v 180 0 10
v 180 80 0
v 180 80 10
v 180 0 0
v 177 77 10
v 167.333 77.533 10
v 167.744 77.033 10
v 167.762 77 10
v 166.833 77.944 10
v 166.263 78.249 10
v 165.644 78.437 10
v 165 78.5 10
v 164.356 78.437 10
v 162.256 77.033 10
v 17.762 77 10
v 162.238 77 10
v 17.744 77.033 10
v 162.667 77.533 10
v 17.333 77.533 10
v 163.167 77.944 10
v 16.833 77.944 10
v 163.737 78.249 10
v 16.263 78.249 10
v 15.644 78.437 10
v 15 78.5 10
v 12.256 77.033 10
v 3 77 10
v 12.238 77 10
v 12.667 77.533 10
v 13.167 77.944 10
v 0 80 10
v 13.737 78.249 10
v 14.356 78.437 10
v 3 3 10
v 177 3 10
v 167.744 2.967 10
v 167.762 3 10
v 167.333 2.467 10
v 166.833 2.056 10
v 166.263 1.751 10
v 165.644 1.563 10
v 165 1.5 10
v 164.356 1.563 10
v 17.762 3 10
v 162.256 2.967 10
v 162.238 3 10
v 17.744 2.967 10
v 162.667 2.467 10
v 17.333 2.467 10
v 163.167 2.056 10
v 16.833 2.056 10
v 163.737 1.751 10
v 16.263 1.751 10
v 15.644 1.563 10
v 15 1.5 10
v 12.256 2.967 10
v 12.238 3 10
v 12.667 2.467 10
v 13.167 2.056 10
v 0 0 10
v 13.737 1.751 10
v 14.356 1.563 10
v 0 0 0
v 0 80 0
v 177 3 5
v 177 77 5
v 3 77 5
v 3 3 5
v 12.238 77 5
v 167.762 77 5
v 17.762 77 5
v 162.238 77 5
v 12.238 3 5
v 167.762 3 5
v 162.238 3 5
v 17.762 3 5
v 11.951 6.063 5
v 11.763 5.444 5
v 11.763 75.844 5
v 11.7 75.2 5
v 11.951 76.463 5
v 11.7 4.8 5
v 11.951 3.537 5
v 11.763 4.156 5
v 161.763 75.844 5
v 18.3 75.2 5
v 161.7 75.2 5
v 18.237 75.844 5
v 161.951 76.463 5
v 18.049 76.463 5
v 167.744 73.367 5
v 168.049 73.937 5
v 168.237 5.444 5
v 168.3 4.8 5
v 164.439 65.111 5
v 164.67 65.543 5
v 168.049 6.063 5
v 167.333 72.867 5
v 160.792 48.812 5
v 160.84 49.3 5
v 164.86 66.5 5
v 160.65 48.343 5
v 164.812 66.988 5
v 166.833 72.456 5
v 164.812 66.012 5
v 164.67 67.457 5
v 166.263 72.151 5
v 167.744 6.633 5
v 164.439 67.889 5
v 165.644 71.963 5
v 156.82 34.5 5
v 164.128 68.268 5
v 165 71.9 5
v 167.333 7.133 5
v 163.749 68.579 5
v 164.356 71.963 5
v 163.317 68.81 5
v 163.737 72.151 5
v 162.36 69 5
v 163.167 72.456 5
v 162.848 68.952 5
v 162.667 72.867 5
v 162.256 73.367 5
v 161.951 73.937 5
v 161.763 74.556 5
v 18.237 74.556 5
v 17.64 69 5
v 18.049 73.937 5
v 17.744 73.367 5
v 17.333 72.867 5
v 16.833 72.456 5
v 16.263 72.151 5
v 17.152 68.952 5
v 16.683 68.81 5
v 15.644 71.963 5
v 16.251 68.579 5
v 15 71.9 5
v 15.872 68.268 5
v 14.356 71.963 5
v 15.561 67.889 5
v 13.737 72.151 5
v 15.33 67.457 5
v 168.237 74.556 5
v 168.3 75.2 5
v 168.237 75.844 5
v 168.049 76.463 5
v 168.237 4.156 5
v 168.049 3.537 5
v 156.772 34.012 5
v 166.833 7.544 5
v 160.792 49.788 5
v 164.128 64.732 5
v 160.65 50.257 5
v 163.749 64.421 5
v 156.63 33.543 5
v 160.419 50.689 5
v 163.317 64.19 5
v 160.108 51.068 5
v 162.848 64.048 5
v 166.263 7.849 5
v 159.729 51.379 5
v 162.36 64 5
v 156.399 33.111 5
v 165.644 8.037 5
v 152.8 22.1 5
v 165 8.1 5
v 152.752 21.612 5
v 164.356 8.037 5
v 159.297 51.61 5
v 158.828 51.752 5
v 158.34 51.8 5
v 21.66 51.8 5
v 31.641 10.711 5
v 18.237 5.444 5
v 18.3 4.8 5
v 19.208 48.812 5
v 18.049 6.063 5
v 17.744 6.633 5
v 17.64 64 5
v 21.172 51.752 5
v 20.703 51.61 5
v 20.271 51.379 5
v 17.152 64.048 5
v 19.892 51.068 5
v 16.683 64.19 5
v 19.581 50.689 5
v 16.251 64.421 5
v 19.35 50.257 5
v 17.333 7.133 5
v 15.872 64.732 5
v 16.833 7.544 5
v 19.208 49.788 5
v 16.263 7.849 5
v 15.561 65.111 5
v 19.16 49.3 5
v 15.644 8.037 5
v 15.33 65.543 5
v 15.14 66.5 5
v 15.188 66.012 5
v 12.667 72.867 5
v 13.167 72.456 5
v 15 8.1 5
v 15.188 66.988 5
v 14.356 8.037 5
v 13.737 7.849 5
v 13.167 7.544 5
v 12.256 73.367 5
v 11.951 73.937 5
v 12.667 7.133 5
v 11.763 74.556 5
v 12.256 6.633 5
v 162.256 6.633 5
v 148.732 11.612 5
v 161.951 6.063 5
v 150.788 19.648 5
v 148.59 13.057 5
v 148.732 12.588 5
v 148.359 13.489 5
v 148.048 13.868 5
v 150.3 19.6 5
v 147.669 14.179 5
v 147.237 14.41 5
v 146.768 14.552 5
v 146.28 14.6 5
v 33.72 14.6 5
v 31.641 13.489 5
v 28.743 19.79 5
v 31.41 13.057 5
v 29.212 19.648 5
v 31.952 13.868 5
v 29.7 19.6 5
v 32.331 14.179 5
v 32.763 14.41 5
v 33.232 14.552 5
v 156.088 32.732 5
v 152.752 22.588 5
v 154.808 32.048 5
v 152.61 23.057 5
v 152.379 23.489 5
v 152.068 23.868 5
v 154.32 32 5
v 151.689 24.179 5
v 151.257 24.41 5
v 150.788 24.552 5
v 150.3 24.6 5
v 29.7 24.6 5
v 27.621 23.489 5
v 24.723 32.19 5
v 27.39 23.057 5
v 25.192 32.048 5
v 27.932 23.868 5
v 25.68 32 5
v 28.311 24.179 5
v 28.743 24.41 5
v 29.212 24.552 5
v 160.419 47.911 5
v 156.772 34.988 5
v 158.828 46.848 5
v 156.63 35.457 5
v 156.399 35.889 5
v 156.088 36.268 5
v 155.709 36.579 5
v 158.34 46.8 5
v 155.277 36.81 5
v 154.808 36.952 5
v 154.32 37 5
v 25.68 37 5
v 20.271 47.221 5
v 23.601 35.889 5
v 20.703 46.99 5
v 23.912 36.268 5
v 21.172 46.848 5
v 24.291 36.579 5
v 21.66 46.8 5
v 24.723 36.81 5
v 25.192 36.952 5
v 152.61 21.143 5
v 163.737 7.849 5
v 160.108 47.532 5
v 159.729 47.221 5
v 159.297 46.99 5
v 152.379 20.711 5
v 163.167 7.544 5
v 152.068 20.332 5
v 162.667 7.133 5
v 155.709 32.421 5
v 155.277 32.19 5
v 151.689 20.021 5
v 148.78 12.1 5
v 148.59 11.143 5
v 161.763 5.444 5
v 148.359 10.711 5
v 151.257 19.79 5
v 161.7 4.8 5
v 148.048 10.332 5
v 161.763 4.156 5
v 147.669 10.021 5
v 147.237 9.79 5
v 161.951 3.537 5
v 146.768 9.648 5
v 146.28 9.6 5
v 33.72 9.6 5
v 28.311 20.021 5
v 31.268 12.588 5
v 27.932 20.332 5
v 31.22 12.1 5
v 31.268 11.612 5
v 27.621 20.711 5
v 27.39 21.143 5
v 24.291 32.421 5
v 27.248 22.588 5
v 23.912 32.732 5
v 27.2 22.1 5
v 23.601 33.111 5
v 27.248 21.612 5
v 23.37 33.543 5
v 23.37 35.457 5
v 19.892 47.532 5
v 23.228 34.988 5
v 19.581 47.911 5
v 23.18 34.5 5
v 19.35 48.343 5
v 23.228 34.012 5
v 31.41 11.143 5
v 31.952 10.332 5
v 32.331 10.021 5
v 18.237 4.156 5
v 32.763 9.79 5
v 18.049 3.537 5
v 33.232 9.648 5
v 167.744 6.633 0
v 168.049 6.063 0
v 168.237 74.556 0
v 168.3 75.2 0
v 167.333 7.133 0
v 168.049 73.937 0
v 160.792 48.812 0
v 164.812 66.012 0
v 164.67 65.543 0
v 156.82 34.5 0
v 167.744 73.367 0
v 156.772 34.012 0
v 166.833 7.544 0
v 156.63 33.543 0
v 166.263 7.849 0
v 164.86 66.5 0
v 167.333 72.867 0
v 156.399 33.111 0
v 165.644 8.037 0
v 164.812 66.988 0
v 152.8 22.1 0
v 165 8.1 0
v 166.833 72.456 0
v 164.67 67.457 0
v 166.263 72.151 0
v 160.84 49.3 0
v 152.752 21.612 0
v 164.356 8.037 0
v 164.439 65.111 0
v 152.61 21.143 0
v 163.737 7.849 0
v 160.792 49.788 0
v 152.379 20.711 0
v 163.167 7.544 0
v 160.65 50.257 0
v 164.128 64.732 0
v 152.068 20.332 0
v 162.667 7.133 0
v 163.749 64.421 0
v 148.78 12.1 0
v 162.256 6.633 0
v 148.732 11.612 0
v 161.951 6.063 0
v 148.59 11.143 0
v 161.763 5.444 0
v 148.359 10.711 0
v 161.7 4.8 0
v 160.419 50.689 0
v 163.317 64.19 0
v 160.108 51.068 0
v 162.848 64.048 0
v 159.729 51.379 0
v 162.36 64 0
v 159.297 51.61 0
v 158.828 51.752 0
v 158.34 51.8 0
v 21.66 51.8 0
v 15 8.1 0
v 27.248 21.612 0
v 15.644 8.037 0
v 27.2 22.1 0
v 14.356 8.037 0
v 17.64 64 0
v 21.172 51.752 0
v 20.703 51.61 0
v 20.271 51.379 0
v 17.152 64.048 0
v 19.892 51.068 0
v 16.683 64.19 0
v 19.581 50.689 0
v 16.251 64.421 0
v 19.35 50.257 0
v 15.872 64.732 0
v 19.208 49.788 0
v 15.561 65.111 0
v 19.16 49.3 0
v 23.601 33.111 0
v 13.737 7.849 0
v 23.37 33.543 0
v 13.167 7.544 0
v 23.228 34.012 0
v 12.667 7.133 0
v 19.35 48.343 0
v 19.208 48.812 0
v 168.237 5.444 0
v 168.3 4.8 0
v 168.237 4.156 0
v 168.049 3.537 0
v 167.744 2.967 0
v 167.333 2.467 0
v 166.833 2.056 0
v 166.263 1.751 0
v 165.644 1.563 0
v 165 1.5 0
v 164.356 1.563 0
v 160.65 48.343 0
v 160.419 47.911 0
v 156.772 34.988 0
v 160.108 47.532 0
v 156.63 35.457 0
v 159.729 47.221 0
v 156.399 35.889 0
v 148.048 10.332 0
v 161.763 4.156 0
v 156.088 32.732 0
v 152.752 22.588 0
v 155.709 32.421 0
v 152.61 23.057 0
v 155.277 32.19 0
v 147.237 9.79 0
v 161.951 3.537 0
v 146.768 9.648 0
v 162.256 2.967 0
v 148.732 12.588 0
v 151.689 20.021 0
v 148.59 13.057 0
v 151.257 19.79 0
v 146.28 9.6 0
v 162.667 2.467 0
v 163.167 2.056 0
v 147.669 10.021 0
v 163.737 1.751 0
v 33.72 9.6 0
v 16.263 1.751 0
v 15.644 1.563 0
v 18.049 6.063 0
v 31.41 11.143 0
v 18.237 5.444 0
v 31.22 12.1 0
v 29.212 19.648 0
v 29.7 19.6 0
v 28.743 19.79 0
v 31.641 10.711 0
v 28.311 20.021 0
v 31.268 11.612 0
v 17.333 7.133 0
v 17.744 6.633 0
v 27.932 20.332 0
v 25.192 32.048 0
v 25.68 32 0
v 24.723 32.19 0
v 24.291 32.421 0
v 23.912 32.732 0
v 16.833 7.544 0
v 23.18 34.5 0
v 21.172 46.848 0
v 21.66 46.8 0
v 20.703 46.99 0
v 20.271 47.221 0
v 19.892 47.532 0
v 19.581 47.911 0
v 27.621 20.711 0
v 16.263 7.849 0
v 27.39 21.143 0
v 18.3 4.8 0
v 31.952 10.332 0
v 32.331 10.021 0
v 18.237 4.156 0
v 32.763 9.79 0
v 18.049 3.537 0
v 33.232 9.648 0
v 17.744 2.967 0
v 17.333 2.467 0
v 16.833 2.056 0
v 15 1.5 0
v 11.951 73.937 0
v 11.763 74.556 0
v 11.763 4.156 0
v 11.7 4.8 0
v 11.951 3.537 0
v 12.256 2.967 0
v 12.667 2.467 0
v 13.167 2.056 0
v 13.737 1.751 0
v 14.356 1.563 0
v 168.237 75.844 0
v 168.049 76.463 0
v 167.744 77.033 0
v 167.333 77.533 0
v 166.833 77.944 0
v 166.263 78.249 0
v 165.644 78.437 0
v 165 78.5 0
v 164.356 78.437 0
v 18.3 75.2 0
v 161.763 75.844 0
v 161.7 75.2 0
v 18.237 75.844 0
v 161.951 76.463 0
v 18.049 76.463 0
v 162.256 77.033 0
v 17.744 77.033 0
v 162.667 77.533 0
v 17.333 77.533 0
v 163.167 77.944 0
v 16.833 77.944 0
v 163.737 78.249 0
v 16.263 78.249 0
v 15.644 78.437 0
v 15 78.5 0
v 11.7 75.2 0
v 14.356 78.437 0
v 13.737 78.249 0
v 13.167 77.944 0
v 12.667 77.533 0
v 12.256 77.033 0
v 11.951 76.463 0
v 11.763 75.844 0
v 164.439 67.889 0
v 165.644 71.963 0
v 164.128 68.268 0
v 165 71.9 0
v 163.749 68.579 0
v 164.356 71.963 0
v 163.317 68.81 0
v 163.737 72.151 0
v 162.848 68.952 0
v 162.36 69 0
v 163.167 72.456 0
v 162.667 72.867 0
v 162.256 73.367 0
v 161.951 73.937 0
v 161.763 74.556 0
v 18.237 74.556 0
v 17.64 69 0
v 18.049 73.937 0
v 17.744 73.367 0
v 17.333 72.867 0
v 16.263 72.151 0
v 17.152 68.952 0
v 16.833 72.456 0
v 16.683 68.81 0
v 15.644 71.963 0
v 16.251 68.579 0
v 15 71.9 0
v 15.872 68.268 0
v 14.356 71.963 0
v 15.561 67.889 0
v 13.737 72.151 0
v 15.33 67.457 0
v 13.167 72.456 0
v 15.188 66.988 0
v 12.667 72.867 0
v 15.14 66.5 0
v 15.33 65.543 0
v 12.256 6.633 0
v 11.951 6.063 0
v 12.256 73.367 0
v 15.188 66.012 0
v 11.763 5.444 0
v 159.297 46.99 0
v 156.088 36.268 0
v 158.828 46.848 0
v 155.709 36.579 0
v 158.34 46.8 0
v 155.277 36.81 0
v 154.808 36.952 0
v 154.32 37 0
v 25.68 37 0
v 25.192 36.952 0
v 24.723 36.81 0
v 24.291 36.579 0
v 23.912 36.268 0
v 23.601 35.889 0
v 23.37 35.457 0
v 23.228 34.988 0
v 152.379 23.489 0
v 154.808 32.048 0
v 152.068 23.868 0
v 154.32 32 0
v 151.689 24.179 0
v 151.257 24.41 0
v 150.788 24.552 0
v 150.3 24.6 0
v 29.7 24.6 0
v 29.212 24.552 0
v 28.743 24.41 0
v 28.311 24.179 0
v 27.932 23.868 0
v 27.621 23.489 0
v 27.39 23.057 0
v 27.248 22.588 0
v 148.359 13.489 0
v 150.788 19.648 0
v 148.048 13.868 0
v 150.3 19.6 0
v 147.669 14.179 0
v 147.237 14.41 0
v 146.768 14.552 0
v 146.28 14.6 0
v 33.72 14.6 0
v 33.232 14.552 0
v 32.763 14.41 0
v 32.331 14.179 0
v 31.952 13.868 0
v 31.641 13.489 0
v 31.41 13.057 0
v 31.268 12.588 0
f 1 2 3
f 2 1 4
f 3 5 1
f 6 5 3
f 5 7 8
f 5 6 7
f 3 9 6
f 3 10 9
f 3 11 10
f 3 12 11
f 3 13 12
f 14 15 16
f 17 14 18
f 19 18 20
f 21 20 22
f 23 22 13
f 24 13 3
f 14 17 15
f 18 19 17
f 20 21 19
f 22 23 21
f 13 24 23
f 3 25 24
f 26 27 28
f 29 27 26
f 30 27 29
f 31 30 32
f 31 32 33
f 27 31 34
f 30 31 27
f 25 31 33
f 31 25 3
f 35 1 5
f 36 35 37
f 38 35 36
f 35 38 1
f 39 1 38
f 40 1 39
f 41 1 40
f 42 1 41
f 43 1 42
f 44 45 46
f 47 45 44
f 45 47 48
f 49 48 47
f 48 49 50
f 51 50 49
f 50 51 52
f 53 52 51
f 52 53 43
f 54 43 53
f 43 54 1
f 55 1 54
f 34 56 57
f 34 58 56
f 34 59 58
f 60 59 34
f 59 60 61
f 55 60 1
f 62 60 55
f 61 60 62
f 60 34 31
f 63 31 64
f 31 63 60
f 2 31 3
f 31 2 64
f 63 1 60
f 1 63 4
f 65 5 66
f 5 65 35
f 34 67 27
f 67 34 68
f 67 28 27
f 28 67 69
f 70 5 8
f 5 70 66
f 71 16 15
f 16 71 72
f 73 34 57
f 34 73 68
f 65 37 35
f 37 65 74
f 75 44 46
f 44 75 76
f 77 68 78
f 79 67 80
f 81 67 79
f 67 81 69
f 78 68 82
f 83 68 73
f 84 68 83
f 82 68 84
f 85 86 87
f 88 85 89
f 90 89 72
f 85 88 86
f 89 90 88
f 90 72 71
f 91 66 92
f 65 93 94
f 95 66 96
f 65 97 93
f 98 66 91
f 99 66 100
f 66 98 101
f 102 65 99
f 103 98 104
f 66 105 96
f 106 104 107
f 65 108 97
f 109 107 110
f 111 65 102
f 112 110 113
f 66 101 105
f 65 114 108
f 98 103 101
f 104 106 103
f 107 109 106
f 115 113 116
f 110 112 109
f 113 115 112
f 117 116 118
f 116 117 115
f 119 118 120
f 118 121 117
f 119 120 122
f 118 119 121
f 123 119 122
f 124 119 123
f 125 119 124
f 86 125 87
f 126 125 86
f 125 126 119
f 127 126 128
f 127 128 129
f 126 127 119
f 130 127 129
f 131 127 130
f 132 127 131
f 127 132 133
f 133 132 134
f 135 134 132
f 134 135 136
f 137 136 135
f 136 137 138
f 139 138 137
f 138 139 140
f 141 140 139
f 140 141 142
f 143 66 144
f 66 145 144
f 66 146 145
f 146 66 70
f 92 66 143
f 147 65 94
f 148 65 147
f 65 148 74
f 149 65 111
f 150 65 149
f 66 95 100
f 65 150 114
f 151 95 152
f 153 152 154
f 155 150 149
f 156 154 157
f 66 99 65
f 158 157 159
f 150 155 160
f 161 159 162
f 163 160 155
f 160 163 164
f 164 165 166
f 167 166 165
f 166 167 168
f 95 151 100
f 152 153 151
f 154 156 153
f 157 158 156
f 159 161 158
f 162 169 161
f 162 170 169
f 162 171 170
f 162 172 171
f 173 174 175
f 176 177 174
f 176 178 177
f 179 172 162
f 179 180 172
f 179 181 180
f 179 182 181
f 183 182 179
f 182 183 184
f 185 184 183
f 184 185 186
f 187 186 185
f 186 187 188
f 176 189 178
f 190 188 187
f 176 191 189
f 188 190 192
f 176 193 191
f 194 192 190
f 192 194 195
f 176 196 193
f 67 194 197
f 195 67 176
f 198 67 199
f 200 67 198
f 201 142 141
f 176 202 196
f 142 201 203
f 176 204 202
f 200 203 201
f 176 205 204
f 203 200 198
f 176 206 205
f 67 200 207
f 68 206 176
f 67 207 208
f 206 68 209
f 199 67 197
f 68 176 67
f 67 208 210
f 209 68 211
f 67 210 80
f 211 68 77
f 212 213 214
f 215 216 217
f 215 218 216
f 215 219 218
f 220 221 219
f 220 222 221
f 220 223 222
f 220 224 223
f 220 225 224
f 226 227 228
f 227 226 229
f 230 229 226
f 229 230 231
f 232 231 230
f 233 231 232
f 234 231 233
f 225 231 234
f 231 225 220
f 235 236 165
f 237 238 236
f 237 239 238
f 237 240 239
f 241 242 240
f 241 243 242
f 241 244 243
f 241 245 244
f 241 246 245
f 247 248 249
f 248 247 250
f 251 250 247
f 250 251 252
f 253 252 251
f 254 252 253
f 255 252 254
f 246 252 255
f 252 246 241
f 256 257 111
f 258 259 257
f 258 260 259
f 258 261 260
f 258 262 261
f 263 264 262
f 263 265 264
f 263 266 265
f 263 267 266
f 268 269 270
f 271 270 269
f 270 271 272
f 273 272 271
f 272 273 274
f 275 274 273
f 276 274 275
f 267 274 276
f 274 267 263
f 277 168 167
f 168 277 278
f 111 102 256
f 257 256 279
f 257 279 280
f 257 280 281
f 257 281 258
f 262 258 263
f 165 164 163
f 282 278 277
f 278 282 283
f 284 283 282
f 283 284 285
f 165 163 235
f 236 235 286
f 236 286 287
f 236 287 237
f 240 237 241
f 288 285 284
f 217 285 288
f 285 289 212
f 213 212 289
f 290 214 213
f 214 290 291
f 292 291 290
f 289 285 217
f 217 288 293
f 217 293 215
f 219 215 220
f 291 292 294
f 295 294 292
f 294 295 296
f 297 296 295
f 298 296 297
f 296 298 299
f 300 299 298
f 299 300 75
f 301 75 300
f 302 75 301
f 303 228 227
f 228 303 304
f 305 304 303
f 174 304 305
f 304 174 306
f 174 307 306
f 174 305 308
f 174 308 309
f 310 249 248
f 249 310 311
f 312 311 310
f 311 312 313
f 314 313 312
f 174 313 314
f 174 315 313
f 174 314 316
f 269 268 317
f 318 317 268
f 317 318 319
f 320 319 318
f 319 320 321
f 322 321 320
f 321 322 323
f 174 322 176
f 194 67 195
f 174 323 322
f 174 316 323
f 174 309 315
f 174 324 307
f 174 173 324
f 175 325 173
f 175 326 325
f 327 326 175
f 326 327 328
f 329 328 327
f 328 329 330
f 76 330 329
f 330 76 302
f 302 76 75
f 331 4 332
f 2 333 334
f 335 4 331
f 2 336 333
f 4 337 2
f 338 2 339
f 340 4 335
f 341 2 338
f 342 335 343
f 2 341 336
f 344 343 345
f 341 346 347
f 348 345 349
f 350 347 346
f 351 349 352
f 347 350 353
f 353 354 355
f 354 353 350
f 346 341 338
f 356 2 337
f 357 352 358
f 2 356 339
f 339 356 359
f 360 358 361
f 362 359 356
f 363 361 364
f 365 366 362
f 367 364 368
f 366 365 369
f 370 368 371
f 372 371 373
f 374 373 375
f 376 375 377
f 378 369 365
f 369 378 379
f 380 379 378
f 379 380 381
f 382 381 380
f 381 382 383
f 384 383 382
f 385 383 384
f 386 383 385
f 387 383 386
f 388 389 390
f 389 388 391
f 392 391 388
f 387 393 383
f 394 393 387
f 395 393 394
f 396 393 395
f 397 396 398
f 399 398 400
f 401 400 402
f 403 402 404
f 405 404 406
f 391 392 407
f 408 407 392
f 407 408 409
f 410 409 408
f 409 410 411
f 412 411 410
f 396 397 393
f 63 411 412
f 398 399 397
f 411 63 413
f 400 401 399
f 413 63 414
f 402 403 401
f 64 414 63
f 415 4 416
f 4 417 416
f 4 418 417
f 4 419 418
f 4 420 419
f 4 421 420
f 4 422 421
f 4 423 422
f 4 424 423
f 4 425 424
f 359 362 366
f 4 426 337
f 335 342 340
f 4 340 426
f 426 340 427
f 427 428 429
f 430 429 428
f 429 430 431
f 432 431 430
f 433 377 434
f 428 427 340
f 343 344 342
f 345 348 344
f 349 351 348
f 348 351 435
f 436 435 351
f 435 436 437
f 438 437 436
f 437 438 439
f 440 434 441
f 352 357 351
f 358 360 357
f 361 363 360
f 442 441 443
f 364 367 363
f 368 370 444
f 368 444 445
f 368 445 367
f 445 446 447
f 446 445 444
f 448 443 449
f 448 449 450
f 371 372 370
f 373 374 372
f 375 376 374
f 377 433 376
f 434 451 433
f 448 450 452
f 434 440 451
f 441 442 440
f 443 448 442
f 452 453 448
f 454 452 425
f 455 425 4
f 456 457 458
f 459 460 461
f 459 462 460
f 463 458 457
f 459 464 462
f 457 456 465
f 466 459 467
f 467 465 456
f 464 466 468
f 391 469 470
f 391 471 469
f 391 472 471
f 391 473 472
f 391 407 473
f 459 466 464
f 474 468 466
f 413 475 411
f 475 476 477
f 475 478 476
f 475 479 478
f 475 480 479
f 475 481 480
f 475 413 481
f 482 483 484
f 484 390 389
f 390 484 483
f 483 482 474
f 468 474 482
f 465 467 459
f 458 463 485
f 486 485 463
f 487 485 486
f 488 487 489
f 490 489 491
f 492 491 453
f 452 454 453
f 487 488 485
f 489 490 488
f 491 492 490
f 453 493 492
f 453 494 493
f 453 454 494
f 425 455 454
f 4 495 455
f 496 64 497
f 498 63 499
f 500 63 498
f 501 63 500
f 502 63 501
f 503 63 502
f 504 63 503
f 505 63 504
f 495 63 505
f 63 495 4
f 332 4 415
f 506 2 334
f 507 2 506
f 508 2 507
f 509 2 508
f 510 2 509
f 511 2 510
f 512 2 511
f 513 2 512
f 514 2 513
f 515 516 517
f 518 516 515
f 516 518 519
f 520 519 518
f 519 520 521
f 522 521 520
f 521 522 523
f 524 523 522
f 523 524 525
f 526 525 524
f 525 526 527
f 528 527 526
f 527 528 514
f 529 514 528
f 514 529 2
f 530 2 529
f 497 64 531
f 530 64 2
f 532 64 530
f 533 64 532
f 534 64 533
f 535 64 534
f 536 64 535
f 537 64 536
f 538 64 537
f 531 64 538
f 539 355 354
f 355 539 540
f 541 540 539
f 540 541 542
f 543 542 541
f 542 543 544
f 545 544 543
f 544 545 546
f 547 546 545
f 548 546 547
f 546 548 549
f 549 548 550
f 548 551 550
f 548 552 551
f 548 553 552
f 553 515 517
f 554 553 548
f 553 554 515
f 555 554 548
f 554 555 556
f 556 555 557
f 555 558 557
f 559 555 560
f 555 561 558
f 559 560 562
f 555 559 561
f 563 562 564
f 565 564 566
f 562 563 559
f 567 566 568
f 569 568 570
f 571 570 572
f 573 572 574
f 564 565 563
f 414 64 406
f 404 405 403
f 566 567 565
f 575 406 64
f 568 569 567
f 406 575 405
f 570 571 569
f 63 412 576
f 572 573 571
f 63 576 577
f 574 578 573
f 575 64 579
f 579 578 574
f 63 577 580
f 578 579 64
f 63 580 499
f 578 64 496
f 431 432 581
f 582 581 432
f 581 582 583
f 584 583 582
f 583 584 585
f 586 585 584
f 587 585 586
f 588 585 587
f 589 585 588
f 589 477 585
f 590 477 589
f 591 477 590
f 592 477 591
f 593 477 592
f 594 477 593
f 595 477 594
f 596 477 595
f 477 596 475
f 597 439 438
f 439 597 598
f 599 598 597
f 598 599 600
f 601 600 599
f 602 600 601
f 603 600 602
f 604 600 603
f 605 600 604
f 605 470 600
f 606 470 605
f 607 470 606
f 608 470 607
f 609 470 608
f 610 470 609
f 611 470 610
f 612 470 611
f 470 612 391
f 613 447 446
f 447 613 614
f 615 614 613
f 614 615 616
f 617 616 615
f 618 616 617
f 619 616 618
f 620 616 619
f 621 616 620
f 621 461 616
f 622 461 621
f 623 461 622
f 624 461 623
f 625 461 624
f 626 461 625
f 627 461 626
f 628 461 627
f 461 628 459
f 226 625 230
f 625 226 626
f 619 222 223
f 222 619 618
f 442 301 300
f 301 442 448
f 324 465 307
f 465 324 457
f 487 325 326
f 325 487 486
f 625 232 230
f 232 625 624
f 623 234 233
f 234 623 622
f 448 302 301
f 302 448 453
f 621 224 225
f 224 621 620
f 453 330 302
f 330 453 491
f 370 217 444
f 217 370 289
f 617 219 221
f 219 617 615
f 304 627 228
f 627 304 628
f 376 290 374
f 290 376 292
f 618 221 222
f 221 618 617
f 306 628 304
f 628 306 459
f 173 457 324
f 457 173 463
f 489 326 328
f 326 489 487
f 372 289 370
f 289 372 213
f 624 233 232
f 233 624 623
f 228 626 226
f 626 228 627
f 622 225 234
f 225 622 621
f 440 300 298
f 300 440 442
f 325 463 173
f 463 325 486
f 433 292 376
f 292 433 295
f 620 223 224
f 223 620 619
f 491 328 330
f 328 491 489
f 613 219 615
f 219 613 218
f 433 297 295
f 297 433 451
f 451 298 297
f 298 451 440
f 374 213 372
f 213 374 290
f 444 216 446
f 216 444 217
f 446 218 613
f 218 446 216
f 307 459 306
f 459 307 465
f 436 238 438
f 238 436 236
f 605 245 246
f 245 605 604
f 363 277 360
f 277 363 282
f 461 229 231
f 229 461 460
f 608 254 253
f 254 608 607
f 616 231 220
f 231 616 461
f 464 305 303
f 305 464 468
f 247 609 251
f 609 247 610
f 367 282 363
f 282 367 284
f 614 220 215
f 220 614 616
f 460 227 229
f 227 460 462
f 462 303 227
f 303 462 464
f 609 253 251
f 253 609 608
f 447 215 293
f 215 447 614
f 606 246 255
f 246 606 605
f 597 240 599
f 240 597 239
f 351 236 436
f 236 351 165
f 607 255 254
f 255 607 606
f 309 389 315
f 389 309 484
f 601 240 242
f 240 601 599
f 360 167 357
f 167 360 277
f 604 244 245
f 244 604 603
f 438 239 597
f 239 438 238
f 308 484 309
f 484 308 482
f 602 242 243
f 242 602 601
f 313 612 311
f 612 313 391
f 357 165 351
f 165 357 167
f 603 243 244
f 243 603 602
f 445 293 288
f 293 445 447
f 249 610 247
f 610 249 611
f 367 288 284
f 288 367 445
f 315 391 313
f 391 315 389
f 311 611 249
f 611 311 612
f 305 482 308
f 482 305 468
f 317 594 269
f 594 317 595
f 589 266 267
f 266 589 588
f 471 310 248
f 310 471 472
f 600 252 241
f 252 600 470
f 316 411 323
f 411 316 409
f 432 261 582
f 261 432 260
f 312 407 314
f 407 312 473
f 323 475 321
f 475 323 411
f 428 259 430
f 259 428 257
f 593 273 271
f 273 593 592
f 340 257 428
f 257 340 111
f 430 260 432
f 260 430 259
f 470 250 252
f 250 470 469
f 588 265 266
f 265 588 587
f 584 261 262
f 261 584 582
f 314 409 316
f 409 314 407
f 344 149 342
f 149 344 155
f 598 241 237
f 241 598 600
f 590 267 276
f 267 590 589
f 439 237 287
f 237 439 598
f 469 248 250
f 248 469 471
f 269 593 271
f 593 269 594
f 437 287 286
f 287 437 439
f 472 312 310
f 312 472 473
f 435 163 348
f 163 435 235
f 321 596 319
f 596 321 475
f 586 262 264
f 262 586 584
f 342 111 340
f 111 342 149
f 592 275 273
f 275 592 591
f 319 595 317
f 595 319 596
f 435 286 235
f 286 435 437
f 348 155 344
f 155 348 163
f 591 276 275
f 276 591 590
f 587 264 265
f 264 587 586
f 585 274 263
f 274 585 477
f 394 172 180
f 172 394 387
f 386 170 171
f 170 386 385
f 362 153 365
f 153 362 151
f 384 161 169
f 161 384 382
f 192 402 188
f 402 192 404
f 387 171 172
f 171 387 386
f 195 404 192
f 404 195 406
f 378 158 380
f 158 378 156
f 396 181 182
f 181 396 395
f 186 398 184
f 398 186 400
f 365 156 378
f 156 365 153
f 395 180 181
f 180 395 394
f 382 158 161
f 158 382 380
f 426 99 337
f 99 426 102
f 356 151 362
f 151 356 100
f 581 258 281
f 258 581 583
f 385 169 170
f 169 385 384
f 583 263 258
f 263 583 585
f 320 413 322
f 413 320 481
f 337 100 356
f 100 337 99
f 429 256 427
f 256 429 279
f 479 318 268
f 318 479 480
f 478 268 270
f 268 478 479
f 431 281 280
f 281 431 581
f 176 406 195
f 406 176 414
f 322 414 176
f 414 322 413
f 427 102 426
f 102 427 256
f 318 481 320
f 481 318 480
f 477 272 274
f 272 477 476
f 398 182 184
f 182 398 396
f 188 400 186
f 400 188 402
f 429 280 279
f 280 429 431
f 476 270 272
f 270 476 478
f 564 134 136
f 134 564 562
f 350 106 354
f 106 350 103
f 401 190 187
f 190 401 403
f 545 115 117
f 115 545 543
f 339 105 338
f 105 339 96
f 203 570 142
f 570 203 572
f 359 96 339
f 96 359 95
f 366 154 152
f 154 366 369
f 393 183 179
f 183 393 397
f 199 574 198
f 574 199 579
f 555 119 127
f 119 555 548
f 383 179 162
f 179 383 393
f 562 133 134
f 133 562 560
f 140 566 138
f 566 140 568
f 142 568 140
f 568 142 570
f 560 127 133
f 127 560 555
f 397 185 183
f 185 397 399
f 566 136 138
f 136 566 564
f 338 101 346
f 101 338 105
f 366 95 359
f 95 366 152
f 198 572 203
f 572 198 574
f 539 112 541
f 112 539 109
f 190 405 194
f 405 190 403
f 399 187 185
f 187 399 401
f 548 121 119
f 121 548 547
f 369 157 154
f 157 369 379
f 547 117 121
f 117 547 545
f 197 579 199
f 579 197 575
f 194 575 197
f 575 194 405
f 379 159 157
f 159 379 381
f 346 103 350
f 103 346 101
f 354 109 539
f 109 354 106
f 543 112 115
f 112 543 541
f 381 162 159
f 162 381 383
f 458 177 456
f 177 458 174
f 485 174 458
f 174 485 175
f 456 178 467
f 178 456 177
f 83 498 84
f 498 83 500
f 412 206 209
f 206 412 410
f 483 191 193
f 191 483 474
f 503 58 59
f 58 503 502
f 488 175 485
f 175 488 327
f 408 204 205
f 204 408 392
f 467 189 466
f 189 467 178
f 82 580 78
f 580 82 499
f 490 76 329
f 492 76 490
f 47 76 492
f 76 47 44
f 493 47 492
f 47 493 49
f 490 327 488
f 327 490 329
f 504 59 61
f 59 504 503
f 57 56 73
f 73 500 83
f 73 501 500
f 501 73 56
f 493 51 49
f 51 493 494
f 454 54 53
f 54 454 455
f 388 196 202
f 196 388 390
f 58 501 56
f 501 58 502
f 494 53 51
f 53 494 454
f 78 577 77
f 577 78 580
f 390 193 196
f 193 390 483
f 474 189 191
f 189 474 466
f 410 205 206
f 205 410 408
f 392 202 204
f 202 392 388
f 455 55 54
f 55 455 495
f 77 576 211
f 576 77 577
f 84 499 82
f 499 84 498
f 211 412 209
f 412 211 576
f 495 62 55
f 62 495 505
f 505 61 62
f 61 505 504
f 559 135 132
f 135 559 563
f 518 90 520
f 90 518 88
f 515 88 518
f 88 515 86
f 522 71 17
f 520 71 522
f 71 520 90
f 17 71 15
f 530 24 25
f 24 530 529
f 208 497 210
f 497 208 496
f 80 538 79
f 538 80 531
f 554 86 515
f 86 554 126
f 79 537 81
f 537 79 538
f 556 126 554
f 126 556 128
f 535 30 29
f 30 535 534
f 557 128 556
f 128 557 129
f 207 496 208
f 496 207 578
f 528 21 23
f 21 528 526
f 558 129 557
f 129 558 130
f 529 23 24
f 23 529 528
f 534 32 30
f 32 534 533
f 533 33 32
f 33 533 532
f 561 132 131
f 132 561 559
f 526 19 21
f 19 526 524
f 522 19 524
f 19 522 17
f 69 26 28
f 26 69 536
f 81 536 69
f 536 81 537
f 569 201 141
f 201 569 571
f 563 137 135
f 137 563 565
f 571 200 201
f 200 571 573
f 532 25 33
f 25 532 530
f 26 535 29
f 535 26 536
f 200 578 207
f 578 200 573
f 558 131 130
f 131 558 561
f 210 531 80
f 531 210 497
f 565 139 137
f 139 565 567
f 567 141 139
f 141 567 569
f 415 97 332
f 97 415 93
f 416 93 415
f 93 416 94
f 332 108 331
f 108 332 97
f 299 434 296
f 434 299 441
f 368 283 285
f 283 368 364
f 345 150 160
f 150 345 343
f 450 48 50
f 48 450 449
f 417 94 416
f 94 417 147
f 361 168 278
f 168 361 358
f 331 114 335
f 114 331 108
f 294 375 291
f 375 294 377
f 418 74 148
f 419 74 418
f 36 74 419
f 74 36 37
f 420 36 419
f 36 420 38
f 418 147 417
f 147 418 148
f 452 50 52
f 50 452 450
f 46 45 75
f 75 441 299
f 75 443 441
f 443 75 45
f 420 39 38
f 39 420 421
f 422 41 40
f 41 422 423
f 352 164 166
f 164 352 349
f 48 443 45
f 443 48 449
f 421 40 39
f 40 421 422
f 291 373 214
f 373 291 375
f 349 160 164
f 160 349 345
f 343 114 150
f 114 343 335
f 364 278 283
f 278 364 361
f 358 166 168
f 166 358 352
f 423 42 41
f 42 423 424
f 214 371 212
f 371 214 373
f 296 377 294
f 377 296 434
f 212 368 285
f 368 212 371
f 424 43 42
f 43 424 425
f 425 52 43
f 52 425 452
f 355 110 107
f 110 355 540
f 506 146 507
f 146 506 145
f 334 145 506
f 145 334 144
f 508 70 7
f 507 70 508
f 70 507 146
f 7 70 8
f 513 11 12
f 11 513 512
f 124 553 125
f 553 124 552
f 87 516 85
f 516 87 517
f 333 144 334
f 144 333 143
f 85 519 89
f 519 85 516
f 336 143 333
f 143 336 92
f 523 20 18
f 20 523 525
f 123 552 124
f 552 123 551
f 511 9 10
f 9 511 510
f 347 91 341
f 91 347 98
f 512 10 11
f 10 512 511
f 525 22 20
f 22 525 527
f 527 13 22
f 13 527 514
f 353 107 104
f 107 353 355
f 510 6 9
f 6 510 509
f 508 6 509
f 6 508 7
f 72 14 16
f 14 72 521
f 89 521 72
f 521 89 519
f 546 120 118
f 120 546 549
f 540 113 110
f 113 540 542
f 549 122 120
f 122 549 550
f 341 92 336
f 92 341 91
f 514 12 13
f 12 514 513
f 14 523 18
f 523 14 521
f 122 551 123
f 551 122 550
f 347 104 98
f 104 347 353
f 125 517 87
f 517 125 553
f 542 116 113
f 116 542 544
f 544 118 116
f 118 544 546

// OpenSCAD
$fn = 32;

// ----------------------------------------------------------------------
// Slotted panel: 180 x 80 mm, 5 рядов of slots
// ----------------------------------------------------------------------

// --- parameters (mm) ---
panel_w = 180;            // panel width
panel_d = 80;             // panel depth
thick = 5;                // panel thickness
slot_w = 5;               // slot width
pitch0 = 10;              // first row pitch
pitch_step = 2.4;         // pitch increase per row
margin = 9.6;             // margin around the slot field
rows = 5;                 // number of slot rows
mount_d = 6.6;            // mounting holes
mount_x = 75;             // mounting hole offset
rim_h = 10;               // rim height
rim_t = 3;                // rim wall thickness

difference() {
  union() {
    cube([panel_w, panel_d, thick]);
    translate([0, 0, thick - 1]) difference() {
      cube([panel_w, panel_d, rim_h - thick + 1]);
      translate([rim_t, rim_t, -2.5]) cube([panel_w - 2 * rim_t, panel_d - 2 * rim_t, rim_h - thick + 6]);
    }
  }
  /* slot rows: stadium shaped cutters, 2.5 mm clear of both faces */
  /* row 0: pitch 10, length 112.56 */
  hull() {
    translate([33.72, 12.1, -2.5]) cylinder(h = thick + 5, d = slot_w);
    translate([146.28, 12.1, -2.5]) cylinder(h = thick + 5, d = slot_w);
  }
  /* row 1: pitch 12.4, length 120.6 */
  hull() {
    translate([29.7, 22.1, -2.5]) cylinder(h = thick + 5, d = slot_w);
    translate([150.3, 22.1, -2.5]) cylinder(h = thick + 5, d = slot_w);
  }
  /* row 2: pitch 14.8, length 128.64 */
  hull() {
    translate([25.68, 34.5, -2.5]) cylinder(h = thick + 5, d = slot_w);
    translate([154.32, 34.5, -2.5]) cylinder(h = thick + 5, d = slot_w);
  }
  /* row 3: pitch 17.2, length 136.68 */
  hull() {
    translate([21.66, 49.3, -2.5]) cylinder(h = thick + 5, d = slot_w);
    translate([158.34, 49.3, -2.5]) cylinder(h = thick + 5, d = slot_w);
  }
  /* row 4: pitch 19.6, length 144.72 */
  hull() {
    translate([17.64, 66.5, -2.5]) cylinder(h = thick + 5, d = slot_w);
    translate([162.36, 66.5, -2.5]) cylinder(h = thick + 5, d = slot_w);
  }
  translate([15, 4.8, -2.5]) cylinder(h = 15, d = mount_d);
  translate([15, 75.2, -2.5]) cylinder(h = 15, d = mount_d);
  translate([165, 4.8, -2.5]) cylinder(h = 15, d = mount_d);
  translate([165, 75.2, -2.5]) cylinder(h = 15, d = mount_d);
}
